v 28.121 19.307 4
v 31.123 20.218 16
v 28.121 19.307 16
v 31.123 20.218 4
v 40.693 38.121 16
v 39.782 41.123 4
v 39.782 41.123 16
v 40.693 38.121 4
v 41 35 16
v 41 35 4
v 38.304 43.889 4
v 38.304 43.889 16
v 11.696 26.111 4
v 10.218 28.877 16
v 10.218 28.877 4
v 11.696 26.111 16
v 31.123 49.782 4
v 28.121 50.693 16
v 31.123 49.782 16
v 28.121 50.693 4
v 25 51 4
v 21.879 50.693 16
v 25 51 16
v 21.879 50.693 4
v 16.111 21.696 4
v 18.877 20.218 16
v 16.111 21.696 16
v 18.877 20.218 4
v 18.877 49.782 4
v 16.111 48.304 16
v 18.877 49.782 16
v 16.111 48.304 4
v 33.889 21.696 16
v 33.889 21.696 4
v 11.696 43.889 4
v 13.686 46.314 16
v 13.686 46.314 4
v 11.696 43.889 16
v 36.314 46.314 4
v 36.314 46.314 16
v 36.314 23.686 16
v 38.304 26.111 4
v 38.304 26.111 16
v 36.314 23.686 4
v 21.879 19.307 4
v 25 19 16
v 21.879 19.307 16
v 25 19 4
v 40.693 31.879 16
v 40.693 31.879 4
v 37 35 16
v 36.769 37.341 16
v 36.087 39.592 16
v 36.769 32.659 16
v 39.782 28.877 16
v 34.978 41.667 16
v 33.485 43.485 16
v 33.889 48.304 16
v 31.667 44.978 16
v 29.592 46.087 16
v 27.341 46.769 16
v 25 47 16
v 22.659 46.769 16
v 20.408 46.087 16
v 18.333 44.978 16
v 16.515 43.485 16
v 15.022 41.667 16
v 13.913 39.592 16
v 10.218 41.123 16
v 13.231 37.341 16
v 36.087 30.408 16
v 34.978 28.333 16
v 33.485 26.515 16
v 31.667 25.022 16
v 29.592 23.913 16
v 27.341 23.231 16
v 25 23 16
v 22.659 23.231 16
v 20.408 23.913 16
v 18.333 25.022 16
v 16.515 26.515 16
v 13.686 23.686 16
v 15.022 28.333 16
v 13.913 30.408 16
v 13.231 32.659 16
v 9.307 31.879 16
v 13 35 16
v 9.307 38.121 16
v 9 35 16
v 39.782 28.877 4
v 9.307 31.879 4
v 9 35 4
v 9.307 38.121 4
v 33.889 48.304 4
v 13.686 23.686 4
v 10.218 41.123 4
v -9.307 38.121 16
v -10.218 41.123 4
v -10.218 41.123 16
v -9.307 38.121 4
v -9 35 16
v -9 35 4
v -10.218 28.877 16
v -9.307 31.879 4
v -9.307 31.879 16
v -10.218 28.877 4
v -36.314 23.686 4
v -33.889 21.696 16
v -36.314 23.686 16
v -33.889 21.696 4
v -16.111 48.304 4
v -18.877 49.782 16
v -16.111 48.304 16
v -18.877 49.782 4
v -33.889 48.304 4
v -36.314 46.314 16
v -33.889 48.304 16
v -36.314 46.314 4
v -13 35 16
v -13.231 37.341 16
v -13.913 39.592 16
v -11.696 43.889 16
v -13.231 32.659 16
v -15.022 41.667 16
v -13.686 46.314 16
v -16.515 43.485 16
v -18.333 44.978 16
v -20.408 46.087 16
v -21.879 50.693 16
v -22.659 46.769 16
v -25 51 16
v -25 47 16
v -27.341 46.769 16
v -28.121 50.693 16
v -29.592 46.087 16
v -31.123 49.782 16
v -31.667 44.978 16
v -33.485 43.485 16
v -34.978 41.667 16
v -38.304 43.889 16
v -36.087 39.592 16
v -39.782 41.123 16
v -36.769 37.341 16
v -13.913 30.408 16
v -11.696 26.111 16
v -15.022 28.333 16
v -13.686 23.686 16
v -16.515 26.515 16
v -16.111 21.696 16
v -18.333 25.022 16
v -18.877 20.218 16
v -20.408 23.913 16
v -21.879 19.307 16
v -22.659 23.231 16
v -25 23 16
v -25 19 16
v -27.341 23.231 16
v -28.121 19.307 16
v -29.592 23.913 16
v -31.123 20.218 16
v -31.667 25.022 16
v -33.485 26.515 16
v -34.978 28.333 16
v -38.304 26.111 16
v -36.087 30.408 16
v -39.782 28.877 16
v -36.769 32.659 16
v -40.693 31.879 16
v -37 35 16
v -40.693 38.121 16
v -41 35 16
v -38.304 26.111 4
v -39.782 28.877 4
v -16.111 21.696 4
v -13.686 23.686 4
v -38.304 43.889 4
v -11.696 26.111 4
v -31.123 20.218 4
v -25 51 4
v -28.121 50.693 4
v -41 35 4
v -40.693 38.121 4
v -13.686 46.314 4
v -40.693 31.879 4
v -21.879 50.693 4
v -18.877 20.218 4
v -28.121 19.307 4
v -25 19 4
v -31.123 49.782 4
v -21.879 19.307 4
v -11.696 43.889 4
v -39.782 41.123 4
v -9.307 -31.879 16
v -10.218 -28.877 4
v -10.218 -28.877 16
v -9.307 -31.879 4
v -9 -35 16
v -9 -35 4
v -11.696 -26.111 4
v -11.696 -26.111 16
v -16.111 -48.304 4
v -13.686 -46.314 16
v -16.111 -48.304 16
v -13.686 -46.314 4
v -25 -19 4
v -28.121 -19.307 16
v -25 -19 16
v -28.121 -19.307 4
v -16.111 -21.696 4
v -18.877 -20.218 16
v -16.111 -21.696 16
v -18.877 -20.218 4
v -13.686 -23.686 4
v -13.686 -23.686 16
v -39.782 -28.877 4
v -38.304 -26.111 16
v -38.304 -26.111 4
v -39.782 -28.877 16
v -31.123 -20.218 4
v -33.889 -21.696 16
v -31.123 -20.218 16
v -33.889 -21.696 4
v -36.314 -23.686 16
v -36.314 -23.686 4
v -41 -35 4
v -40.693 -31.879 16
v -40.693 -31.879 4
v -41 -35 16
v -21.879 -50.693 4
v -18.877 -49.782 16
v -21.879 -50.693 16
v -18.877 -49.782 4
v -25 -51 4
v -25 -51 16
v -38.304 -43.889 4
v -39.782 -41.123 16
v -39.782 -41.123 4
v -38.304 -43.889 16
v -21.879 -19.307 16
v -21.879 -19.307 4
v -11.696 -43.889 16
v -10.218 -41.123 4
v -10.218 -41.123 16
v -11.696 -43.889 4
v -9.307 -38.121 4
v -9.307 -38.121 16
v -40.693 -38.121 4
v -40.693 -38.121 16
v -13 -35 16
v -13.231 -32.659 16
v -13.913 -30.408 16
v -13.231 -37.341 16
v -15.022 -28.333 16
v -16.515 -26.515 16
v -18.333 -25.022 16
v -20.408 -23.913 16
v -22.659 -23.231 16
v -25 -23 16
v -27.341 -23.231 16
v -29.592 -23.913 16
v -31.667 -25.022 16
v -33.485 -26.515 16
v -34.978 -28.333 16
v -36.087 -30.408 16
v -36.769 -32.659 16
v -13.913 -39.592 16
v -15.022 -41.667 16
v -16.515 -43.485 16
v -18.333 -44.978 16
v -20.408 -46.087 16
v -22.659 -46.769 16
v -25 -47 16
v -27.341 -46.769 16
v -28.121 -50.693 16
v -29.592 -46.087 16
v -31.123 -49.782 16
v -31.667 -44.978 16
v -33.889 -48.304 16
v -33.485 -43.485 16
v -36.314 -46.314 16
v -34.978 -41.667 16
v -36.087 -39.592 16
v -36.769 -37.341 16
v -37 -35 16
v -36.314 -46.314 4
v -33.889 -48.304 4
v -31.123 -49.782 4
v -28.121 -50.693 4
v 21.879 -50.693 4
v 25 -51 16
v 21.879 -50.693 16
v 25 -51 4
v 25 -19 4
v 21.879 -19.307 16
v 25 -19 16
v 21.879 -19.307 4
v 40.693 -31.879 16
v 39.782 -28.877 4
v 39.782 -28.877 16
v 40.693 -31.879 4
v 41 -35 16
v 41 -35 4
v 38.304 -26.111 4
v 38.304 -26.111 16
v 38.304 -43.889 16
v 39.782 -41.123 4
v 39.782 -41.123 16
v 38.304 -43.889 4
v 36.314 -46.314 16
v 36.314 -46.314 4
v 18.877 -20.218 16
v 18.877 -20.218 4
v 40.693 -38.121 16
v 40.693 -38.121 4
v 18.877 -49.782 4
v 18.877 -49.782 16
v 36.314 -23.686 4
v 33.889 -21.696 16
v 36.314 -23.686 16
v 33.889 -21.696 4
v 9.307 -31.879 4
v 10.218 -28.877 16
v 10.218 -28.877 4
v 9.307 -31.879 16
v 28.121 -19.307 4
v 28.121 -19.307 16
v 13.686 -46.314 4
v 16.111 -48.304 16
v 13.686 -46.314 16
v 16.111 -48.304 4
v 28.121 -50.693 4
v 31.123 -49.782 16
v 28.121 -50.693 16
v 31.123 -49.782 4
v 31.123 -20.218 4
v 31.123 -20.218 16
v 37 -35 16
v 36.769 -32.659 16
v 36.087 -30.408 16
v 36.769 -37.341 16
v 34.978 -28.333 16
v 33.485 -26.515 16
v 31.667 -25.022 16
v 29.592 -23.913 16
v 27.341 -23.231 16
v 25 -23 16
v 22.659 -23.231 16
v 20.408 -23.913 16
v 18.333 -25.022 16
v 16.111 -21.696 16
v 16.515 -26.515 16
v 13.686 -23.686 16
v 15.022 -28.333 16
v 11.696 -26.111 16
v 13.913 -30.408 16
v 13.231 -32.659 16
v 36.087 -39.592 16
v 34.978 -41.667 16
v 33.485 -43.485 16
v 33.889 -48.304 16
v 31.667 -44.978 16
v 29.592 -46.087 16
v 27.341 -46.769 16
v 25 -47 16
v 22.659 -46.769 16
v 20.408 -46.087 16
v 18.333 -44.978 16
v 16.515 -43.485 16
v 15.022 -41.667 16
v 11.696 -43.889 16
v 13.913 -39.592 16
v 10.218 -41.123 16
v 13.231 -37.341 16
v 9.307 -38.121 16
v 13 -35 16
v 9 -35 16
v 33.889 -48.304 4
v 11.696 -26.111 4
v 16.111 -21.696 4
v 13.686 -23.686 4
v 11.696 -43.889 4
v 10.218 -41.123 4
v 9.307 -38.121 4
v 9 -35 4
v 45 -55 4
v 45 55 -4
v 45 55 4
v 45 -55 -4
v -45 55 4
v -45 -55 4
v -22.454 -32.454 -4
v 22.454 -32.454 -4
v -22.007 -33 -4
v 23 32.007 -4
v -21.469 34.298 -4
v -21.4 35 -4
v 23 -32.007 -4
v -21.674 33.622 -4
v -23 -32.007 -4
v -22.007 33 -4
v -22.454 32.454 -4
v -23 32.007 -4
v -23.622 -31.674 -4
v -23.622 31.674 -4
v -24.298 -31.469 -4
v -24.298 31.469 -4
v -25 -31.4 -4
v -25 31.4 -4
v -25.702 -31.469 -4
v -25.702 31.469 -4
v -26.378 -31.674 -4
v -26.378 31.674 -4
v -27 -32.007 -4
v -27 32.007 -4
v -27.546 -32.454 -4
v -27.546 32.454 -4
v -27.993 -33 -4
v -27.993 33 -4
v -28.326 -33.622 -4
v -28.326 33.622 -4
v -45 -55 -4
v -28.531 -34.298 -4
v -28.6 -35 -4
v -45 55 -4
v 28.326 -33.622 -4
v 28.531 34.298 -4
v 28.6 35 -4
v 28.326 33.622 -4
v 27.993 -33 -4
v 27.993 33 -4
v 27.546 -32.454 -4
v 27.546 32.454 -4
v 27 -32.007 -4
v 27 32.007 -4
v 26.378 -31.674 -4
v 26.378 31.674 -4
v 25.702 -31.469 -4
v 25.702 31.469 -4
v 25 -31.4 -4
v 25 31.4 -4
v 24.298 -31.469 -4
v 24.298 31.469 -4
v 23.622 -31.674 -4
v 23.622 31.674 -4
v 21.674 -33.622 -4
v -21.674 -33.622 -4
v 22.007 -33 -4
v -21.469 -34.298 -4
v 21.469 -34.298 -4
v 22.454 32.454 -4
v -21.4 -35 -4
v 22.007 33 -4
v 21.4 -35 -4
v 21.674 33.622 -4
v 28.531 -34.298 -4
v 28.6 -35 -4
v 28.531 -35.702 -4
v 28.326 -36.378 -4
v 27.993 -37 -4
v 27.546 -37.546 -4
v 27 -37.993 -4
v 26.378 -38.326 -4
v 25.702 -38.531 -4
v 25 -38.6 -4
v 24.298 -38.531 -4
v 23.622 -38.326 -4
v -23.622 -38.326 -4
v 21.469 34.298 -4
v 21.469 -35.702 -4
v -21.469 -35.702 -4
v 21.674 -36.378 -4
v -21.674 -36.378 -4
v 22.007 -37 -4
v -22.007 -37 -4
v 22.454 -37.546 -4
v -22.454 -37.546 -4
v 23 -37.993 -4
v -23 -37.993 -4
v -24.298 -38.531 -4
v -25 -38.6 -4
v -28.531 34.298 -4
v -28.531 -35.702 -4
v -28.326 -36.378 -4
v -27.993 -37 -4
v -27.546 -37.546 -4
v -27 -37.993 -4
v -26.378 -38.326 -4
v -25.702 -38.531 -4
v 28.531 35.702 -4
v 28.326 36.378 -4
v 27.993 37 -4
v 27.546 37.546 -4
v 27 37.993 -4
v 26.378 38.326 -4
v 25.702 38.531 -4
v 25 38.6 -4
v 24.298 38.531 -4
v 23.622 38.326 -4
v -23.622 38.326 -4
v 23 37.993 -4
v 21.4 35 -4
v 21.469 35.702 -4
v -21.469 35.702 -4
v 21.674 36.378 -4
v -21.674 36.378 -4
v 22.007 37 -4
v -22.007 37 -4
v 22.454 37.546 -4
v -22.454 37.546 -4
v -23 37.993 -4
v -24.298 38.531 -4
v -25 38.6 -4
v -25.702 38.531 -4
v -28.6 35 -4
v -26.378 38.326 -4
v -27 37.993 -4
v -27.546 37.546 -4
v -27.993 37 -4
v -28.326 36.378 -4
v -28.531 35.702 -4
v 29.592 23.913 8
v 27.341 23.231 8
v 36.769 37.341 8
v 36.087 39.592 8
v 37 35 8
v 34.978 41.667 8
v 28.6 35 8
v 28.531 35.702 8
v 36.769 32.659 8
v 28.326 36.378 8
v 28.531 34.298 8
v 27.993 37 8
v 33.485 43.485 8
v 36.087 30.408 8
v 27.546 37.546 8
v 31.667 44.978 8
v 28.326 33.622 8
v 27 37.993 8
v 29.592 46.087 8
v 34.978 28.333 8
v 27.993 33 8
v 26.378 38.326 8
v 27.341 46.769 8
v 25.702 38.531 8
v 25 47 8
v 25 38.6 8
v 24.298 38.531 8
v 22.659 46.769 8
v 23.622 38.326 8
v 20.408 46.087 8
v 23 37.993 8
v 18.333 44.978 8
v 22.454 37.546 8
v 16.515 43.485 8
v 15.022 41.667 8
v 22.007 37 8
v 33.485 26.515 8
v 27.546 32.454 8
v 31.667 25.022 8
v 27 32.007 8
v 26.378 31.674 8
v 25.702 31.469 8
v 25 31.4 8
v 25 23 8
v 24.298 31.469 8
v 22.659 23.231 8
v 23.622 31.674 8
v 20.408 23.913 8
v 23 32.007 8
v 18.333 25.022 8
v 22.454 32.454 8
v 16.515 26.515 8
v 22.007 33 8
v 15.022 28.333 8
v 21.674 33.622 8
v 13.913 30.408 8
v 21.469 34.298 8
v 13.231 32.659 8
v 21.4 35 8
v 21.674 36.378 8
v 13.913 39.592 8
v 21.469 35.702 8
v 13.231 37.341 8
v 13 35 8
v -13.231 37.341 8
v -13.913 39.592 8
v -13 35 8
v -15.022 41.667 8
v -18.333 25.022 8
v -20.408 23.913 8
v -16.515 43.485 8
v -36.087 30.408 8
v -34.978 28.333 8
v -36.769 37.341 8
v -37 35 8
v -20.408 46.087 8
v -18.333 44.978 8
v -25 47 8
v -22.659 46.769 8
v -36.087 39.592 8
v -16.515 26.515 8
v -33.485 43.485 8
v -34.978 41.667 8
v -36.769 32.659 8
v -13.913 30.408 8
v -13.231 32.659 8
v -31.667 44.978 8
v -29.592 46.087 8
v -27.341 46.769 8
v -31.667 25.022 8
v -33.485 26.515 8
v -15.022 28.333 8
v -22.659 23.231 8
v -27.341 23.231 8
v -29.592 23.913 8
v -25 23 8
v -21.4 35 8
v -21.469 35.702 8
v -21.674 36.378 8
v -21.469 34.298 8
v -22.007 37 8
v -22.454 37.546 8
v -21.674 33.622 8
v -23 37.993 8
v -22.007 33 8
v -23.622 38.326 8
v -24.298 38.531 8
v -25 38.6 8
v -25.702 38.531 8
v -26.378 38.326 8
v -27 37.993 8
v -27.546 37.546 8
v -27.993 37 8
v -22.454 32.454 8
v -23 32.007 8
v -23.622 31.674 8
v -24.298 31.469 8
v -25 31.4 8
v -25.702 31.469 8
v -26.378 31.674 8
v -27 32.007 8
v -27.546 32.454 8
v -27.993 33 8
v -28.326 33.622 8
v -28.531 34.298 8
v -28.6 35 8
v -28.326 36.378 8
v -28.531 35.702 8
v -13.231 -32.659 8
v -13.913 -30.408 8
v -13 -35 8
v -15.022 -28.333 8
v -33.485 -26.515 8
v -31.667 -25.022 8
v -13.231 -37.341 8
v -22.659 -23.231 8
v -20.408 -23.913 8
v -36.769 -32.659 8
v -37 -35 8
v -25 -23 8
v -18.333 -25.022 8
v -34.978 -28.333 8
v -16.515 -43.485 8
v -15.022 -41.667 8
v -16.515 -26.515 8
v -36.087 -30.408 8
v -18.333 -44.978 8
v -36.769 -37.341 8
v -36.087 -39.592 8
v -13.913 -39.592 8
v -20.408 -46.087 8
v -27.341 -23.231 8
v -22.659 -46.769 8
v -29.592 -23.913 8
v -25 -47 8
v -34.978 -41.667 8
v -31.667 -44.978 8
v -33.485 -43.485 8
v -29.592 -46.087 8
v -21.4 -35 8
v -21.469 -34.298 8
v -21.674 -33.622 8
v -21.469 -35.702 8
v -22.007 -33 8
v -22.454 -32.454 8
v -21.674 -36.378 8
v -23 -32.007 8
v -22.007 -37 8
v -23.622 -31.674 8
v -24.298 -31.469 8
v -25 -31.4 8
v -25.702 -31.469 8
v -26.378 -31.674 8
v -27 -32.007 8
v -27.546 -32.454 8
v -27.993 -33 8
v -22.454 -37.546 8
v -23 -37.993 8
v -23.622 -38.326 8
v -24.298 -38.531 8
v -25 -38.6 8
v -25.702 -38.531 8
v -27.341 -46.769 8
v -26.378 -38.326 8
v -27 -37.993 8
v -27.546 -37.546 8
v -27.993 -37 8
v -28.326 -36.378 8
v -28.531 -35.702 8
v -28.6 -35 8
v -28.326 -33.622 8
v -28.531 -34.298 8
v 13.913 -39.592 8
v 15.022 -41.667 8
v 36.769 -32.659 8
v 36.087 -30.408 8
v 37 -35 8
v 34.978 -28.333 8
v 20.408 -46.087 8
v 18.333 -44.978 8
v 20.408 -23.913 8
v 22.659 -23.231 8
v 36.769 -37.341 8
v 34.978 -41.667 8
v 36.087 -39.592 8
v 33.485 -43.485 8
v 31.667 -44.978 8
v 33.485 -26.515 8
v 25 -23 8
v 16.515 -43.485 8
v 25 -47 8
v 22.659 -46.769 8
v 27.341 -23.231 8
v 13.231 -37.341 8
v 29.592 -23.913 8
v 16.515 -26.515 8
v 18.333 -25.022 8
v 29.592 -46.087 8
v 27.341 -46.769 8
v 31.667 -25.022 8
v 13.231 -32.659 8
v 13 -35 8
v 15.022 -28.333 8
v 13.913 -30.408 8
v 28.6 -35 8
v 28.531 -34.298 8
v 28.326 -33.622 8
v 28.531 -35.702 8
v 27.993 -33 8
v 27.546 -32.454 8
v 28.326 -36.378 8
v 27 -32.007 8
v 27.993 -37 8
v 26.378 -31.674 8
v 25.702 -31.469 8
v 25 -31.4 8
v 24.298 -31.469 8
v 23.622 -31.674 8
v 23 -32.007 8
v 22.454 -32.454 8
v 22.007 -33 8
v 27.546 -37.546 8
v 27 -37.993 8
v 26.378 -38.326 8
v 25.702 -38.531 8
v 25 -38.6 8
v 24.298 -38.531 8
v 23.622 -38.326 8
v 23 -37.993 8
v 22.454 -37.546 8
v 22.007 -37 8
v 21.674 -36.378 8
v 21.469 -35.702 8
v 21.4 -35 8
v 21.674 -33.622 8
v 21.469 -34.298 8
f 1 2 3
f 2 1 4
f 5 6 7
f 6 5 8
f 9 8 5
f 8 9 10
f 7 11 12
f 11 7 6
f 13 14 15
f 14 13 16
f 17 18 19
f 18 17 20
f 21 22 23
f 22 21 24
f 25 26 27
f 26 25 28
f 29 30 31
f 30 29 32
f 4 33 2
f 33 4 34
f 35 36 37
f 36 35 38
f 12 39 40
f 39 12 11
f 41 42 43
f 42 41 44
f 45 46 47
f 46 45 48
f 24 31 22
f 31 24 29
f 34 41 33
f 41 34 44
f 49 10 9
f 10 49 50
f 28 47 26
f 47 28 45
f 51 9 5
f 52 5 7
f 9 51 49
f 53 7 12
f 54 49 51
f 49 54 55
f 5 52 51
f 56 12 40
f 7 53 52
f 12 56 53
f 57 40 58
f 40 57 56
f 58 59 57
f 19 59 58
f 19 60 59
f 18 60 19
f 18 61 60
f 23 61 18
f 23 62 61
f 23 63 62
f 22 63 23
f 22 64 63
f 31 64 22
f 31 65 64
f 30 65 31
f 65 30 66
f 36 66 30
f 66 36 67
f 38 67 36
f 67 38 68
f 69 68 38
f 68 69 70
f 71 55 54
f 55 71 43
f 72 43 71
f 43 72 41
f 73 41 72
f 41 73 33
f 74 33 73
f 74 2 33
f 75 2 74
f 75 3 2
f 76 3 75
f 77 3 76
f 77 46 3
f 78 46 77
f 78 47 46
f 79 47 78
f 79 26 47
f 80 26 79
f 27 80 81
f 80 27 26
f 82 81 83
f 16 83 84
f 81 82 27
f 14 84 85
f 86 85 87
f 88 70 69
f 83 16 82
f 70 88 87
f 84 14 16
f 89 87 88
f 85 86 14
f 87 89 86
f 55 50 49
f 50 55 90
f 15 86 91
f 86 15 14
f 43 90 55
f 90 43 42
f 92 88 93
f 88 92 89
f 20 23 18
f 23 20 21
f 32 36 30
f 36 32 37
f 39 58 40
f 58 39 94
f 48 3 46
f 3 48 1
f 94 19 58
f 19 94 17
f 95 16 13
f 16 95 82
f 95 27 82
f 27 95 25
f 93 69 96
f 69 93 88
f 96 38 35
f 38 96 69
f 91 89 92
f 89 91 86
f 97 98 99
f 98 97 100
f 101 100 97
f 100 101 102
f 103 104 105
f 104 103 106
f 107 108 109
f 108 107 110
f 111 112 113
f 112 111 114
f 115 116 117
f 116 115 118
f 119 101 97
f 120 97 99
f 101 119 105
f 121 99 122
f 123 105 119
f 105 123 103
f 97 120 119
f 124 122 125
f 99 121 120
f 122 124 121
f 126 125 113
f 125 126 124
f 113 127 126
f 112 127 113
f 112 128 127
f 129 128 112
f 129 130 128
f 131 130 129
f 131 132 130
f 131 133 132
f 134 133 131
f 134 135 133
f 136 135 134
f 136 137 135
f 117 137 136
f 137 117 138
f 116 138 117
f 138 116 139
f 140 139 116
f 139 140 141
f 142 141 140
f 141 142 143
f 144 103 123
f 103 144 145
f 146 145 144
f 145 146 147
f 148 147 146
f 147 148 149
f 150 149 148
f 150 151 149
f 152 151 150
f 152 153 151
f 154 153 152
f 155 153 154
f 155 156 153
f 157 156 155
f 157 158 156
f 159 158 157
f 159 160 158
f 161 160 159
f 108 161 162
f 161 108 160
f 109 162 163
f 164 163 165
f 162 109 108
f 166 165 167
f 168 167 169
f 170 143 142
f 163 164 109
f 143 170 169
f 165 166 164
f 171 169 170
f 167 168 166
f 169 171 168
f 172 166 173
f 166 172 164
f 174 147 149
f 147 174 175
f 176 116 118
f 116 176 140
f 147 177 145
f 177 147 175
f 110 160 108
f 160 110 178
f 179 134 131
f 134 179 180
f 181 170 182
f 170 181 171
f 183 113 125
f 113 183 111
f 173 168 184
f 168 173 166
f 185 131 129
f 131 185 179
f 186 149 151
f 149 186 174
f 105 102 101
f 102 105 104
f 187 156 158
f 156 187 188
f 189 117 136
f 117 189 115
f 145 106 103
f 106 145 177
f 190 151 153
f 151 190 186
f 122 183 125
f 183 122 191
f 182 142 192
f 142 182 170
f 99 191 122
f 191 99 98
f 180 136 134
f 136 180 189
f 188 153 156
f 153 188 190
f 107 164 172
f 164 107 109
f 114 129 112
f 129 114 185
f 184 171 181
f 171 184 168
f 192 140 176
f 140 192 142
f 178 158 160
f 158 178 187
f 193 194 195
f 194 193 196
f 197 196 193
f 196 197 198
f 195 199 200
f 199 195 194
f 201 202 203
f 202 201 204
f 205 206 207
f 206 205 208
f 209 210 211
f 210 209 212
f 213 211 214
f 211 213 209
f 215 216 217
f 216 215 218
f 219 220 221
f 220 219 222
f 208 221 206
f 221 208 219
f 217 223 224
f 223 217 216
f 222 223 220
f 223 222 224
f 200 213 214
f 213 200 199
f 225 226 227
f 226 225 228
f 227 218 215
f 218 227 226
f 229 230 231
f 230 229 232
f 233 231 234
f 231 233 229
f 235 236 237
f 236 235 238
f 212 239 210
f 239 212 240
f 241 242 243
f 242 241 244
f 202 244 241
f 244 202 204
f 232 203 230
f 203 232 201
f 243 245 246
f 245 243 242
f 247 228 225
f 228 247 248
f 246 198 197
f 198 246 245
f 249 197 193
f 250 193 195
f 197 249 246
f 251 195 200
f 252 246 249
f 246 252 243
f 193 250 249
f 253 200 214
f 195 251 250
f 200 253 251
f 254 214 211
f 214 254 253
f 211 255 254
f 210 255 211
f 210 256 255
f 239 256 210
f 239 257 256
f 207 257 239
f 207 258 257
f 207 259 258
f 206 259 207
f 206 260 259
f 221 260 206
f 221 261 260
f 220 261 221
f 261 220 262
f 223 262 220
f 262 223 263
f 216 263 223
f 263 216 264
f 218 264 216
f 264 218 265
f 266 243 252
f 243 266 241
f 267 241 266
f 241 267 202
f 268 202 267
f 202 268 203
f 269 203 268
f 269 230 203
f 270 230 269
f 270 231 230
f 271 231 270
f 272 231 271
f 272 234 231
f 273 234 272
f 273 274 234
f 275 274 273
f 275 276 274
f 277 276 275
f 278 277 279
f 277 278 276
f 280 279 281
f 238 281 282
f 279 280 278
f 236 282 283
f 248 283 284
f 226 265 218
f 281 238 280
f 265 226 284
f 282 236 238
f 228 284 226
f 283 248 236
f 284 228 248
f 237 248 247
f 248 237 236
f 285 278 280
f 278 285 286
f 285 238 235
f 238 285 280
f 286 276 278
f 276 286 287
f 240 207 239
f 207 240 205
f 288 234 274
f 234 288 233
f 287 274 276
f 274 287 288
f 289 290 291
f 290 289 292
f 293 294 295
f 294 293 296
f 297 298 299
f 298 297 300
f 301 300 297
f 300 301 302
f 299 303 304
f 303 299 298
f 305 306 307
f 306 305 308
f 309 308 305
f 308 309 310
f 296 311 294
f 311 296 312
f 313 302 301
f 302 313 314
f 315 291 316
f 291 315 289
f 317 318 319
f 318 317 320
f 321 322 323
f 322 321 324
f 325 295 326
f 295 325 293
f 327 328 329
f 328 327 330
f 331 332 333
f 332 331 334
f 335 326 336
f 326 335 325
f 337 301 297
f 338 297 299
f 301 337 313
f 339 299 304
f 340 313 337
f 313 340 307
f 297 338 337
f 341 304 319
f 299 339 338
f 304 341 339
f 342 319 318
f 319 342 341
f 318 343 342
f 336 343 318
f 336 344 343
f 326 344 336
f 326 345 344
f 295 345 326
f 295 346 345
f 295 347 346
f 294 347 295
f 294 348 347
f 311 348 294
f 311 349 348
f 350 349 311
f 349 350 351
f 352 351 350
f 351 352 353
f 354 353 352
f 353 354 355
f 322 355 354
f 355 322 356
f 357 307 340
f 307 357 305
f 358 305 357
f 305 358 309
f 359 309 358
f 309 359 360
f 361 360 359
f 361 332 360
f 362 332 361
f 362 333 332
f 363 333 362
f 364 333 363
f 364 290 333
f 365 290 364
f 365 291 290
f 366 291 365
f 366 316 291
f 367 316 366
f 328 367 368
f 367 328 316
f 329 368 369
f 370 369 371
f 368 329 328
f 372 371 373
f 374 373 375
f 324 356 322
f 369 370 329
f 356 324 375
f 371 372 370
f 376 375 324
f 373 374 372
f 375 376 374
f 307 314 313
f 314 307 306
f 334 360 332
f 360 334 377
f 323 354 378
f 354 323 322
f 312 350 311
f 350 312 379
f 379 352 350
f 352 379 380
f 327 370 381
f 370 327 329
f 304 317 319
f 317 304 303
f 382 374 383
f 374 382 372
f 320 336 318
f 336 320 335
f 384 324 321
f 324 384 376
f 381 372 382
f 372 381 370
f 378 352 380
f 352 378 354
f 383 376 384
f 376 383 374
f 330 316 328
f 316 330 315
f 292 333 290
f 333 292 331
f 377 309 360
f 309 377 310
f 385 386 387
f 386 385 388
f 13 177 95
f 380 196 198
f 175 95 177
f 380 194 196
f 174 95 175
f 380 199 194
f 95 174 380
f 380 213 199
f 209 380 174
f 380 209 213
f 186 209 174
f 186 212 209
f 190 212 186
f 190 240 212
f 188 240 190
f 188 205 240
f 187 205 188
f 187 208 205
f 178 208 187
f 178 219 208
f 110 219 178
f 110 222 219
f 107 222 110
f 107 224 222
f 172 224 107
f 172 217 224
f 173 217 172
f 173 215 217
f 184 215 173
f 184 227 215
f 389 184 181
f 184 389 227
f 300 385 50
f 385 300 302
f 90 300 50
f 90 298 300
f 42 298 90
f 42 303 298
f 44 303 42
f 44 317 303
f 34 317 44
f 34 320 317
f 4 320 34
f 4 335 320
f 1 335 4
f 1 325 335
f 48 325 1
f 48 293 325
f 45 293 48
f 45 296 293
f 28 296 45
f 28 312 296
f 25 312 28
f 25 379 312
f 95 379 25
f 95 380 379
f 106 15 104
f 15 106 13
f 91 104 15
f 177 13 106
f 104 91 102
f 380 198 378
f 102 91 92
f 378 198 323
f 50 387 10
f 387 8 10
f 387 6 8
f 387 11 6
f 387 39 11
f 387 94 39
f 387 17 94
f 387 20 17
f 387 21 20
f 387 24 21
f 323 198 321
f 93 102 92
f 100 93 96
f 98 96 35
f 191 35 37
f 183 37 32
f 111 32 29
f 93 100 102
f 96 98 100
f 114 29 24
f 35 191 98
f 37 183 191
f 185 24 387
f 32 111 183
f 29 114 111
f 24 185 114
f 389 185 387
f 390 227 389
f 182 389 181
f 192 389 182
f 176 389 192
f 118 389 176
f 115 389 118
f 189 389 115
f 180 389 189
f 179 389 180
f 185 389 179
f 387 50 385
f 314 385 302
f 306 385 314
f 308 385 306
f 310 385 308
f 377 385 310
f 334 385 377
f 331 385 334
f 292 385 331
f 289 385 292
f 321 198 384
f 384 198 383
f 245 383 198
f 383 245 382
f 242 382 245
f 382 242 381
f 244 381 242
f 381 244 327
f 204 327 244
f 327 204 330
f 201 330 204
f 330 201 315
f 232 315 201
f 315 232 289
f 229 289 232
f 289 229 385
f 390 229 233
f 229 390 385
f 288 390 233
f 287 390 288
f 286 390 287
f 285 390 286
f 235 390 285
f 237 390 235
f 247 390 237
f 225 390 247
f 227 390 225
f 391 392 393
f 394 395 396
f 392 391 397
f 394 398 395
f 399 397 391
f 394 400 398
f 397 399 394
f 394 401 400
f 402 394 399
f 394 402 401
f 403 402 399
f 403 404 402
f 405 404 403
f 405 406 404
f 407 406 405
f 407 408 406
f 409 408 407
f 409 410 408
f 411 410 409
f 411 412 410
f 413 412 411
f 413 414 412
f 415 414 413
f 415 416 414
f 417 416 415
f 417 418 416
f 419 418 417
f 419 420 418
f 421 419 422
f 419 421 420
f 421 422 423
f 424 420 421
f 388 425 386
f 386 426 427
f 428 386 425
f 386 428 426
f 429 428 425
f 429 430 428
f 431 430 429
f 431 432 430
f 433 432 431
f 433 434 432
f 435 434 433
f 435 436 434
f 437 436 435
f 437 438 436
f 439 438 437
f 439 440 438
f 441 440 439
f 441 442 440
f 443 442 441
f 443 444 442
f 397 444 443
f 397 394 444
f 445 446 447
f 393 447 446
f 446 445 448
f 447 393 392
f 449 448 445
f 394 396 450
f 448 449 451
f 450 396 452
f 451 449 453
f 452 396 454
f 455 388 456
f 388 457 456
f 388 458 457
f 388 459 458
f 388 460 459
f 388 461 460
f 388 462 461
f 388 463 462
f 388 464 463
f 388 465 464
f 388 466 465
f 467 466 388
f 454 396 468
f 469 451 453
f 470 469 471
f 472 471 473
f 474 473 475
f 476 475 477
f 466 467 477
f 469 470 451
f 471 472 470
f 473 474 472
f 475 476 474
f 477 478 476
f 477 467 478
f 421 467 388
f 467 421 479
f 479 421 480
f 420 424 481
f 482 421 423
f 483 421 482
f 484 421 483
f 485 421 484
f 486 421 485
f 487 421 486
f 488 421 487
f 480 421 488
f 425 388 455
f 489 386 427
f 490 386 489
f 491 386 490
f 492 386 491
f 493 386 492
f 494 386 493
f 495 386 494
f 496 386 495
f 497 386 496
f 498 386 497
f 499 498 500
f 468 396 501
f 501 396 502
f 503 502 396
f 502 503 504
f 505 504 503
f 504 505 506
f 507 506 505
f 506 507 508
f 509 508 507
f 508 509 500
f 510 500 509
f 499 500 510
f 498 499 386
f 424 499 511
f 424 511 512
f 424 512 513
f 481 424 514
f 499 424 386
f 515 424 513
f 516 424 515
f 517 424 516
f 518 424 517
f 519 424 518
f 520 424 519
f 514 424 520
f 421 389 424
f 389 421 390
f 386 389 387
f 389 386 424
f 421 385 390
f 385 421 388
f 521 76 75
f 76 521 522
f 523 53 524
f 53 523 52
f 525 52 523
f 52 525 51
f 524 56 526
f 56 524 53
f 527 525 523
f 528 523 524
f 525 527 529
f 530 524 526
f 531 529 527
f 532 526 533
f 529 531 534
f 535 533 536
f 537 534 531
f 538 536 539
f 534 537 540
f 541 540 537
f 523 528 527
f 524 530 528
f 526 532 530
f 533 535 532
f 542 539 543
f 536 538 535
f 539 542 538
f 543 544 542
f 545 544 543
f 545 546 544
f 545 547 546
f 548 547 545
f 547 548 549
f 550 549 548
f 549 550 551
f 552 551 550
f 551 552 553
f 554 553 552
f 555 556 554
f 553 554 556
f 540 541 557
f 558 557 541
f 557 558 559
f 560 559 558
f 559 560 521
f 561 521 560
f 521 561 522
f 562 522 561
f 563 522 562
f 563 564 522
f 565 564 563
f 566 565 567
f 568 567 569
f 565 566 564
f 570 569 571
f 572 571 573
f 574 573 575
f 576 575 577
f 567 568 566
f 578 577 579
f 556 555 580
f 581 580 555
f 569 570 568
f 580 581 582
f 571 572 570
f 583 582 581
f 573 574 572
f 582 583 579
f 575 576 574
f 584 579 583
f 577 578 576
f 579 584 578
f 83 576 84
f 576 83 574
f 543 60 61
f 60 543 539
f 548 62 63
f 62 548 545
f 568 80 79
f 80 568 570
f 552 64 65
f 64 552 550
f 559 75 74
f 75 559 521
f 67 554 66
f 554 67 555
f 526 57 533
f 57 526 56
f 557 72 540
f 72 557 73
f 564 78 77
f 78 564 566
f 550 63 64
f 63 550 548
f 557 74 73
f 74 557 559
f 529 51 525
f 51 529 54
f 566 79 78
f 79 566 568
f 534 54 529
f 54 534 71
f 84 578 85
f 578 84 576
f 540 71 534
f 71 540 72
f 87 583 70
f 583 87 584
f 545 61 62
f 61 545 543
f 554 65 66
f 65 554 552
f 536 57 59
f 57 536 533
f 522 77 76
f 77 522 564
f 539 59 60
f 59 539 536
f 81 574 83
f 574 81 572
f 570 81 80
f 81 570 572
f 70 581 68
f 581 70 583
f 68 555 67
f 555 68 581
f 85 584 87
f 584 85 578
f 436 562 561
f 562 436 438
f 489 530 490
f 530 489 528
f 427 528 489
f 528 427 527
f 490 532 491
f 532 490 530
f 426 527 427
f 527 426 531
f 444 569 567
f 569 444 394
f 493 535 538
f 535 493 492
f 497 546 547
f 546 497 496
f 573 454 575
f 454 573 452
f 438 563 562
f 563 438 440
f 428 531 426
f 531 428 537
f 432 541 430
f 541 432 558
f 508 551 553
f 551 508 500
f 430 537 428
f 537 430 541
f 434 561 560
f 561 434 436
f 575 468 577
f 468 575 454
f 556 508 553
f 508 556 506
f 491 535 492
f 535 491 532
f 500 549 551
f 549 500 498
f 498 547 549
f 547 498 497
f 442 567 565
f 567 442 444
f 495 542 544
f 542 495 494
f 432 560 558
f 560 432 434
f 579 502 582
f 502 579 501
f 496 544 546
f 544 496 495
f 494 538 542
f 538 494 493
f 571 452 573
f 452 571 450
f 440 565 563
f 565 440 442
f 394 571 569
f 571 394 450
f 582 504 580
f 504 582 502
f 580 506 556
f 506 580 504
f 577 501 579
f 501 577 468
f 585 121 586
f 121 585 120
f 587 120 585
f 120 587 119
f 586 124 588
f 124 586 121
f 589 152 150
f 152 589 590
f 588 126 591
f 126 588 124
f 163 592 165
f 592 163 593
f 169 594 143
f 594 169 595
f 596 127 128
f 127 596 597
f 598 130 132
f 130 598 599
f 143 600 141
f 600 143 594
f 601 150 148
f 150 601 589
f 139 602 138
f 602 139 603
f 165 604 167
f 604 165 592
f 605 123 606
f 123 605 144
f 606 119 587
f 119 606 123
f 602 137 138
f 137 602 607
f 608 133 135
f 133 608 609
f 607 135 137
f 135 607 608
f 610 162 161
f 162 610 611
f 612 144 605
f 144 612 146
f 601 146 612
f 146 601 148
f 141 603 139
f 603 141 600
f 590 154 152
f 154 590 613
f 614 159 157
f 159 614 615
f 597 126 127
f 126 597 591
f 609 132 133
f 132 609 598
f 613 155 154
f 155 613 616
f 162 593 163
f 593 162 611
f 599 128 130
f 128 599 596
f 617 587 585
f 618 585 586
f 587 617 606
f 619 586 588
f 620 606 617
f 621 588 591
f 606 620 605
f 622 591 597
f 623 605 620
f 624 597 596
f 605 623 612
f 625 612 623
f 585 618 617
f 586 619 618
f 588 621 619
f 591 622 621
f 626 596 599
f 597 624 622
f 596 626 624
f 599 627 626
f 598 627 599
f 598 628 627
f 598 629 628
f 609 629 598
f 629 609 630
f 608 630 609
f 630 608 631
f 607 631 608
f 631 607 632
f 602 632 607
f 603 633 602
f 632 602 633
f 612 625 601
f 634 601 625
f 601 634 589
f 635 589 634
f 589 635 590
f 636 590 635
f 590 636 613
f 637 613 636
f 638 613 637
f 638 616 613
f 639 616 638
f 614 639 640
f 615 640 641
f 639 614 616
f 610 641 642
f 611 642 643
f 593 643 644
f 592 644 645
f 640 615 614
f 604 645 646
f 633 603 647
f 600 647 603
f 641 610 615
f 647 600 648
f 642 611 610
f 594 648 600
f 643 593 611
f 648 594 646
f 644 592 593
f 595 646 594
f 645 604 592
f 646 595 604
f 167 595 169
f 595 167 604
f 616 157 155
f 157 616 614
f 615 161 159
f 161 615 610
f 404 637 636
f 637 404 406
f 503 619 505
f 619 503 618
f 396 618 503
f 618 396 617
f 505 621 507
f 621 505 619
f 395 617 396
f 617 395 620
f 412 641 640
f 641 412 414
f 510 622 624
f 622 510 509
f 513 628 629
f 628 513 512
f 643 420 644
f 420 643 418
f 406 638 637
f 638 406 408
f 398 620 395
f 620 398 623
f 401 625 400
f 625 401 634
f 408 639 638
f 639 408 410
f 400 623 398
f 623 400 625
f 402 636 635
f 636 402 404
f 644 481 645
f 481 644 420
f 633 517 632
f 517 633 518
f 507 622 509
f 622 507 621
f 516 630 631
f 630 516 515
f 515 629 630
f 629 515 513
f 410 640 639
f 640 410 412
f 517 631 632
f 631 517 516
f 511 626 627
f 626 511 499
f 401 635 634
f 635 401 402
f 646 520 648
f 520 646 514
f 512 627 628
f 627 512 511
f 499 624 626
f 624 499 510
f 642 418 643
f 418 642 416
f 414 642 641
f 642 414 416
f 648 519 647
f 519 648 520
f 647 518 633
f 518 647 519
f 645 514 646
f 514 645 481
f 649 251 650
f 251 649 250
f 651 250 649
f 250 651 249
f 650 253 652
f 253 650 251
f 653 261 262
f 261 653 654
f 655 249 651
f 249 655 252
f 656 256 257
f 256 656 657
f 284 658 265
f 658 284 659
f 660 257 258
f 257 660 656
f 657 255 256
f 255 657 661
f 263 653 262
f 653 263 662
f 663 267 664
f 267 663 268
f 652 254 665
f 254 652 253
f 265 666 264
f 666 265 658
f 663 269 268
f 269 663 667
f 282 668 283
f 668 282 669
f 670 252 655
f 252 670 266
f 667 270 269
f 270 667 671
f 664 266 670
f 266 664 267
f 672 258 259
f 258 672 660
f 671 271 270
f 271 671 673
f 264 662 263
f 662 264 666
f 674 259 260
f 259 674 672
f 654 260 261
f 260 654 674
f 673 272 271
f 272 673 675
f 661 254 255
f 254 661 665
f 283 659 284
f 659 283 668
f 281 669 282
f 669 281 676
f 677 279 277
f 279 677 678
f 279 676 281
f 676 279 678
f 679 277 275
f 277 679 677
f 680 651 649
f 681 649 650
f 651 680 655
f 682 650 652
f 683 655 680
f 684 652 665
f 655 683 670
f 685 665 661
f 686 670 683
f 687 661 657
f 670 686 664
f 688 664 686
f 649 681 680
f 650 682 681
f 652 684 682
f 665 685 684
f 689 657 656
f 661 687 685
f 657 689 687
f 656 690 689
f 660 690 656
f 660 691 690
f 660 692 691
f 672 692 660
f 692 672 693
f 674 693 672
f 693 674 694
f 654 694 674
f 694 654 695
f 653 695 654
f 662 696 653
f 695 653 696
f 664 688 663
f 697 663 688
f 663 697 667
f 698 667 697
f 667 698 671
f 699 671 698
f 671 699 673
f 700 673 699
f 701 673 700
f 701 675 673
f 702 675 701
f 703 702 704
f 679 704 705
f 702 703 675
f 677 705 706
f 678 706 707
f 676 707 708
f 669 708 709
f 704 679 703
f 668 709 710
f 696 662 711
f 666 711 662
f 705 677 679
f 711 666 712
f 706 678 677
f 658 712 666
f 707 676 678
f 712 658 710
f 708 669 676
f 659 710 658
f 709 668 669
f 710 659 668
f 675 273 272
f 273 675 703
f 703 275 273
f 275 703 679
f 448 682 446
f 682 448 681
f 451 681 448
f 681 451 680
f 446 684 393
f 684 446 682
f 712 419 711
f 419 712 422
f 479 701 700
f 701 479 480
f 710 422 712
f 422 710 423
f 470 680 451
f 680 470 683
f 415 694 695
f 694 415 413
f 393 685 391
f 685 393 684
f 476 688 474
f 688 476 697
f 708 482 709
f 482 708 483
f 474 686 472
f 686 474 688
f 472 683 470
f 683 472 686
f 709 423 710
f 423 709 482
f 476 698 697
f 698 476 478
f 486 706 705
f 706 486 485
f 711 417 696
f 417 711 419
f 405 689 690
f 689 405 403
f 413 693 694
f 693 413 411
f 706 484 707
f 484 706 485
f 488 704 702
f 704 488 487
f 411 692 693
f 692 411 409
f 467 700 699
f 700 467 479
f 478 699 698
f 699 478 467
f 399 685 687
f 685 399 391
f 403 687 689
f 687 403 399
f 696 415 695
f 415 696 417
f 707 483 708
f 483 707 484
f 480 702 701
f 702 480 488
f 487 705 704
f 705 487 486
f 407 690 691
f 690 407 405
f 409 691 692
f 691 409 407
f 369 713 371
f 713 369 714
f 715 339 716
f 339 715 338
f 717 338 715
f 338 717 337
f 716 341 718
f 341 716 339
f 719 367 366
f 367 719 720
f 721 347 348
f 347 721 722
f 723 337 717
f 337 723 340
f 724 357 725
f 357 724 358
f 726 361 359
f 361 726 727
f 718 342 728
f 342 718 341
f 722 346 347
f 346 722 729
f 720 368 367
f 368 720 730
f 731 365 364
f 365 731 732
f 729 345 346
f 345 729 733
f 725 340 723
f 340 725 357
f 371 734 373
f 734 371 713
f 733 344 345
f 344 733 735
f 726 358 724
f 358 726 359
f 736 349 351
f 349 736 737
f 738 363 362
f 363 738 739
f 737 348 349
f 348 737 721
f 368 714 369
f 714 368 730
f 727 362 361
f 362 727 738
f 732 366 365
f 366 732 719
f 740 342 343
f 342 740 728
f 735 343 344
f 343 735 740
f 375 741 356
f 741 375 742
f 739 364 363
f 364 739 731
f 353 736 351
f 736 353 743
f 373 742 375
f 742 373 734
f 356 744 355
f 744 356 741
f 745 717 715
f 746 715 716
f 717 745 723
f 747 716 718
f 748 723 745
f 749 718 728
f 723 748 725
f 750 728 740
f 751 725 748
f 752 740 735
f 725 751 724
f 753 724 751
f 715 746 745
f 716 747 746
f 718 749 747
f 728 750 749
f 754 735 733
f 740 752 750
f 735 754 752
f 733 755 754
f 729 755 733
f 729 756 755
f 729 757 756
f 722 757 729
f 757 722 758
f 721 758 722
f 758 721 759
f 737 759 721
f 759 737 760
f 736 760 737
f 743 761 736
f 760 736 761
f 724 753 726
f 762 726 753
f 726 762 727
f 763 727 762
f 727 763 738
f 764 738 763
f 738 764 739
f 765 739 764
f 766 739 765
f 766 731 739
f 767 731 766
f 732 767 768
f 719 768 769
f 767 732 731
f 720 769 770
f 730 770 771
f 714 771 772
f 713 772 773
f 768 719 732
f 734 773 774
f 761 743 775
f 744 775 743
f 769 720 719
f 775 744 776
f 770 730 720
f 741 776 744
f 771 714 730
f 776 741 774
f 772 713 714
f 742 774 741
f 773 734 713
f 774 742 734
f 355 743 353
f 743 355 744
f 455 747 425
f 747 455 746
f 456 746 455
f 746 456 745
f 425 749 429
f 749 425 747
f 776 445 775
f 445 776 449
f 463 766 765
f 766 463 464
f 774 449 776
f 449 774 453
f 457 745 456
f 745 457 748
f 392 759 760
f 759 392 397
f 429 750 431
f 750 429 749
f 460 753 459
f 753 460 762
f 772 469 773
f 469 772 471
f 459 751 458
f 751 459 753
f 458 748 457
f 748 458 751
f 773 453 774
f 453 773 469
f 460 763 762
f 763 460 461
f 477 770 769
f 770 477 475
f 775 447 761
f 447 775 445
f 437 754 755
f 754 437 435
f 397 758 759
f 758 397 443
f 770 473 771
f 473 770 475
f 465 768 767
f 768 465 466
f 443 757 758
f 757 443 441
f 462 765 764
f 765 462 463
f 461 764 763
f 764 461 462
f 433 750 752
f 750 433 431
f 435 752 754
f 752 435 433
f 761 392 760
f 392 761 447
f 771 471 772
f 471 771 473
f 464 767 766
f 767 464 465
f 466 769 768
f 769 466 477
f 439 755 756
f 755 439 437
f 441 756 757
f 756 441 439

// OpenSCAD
$fn = 32;

// ----------------------------------------------------------------------
// Socket pad plate
// bosses with counterbored sockets for the screws
// ----------------------------------------------------------------------

// --- parameters (mm) ---
base_t = 8;            // base plate thickness
boss_h = 12;           // boss height above the base plate
boss_d = 32;           // boss diameter
socket_d = 24;         // socket diameter
socket_depth = 8;      // socket depth from the boss face
bolt_d = 7.2;          // screw clearance hole through the socket floor
plate = [90, 110, 8];  // overall size (x, y, z)
edge = 20;             // boss centre offset from the plate edge
pads = 4;              // boss count, one per corner

// --- derived feature positions (mm) ---
height = base_t + boss_h;        // = 20   overall height of the part
corner_x = plate[0] / 2 - edge;  // = 25   boss centre X
corner_y = plate[1] / 2 - edge;  // = 35   boss centre Y
feature_centers = [
  [corner_x, corner_y],
  [-corner_x, corner_y],
  [-corner_x, -corner_y],
  [corner_x, -corner_y]
];   // boss centres: sockets, holes and the pads themselves are placed from here

// base plate, bosses on feature_centers, socket + through hole in each
difference() {
  union() {
    cube(plate, center = true);
    for (centre = feature_centers)
      translate([centre[0], centre[1], plate[2] / 2 - 1])
        cylinder(d = boss_d, h = boss_h + 1);
  }
  for (centre = feature_centers) {
    translate([centre[0], centre[1], plate[2] / 2 + boss_h - socket_depth])
      cylinder(d = socket_d, h = socket_depth + 1);
    translate([centre[0], centre[1], -height])
      cylinder(d = bolt_d, h = 2 * height + 2);  // through the socket floor
  }
}
